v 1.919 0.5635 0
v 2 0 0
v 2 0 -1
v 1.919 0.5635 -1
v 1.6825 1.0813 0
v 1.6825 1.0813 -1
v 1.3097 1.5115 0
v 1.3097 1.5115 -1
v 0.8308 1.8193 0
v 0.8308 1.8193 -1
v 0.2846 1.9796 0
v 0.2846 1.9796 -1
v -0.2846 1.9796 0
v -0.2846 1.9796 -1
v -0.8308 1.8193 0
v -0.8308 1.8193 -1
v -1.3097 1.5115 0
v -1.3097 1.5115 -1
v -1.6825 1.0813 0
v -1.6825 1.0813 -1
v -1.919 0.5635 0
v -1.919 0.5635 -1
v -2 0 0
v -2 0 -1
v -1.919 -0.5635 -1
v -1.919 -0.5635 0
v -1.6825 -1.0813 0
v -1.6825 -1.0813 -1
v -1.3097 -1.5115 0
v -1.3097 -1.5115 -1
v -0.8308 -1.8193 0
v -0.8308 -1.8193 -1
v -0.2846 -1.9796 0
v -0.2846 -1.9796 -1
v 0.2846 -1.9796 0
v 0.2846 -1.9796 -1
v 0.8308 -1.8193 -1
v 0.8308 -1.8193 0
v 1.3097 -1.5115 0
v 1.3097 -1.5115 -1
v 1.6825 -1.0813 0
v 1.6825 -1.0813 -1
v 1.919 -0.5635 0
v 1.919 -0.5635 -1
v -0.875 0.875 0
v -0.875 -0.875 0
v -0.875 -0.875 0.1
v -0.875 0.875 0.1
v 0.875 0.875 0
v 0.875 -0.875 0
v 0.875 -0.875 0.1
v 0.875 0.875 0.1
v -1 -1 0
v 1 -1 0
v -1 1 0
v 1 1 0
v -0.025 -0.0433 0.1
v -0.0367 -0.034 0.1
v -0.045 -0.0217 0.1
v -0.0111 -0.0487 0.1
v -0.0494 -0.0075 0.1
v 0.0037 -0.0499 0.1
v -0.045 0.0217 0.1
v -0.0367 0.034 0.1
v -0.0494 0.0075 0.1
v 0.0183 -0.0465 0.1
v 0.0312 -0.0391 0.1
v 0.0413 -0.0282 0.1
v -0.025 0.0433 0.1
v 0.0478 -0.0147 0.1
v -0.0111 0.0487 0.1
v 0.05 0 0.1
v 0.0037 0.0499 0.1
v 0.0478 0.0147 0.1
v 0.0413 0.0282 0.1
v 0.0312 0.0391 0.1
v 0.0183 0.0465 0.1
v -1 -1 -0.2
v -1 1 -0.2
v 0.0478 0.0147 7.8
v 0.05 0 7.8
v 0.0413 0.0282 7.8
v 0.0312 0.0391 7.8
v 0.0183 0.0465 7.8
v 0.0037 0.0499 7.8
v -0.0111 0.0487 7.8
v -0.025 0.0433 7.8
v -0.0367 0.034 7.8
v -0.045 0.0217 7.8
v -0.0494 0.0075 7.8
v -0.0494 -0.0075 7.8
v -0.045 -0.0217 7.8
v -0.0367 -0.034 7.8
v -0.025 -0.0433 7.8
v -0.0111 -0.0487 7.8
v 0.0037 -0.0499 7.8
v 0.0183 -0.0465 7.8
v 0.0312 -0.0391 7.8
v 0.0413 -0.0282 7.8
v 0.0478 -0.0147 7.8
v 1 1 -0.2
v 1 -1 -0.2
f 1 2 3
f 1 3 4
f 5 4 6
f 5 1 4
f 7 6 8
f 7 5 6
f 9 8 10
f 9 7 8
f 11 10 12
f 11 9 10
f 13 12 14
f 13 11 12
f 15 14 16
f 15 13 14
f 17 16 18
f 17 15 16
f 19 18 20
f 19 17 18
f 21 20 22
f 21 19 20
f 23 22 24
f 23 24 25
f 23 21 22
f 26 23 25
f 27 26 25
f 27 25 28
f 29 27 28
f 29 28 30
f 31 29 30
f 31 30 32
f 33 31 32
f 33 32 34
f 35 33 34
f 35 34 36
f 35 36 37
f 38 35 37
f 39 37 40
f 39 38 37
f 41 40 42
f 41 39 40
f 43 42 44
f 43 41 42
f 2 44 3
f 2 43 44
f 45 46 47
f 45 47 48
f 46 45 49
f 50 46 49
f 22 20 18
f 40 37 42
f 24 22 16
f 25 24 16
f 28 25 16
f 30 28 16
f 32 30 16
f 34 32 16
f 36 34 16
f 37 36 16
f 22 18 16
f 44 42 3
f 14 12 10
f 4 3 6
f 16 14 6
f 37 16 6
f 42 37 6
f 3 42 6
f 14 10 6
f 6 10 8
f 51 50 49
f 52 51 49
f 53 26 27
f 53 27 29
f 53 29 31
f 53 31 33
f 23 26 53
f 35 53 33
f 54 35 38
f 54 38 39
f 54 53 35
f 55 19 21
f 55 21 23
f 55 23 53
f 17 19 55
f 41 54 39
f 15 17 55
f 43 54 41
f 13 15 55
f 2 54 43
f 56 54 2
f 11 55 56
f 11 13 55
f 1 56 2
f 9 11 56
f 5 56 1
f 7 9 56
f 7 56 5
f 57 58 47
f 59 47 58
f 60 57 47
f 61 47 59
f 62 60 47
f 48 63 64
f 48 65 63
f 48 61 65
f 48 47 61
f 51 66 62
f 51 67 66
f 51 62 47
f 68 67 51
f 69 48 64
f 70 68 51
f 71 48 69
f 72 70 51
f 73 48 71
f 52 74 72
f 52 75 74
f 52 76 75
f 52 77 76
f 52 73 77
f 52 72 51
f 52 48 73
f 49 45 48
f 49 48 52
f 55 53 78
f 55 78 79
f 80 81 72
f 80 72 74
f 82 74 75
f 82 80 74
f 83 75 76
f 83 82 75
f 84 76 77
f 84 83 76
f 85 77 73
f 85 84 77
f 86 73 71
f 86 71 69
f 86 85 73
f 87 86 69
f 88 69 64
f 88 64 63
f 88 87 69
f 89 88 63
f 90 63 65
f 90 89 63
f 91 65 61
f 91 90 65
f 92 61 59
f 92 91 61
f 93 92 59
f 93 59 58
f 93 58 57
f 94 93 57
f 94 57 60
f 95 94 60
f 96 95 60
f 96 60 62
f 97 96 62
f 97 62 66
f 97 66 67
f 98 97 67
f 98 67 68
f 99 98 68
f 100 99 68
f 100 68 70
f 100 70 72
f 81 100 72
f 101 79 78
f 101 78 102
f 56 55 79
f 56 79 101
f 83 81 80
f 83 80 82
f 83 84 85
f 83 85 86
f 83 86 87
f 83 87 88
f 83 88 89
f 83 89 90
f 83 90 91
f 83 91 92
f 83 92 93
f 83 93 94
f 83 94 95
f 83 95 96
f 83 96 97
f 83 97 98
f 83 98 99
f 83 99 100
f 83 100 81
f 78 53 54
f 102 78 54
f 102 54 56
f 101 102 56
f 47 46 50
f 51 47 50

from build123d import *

# Parameters (mm, degrees)
F2_R     = 0.05
F3_DEPTH = 7.8
F0_W     = 1.75
F0_H     = 1.75
F4_DEPTH = 0.1
F5_R     = 2
F6_DEPTH = 1
F7_W     = 2
F7_H     = 2
F8_DEPTH = 0.2


with BuildPart() as f3:
    # F2 (on offset) → F3 (new body)
    with BuildSketch(Plane.XY.offset(7.8)):
        Circle(F2_R)
    extrude(amount=-F3_DEPTH)

    # F0 (on Top) → F4 (join)
    with BuildSketch(Plane.XY):
        Rectangle(F0_W, F0_H)
    extrude(amount=F4_DEPTH)


with BuildPart() as f6:
    # F5 (on Top) → F6 (new body)
    with BuildSketch(Plane.XY):
        Circle(F5_R)
    extrude(amount=-F6_DEPTH)

    # F7 (on face) → F8 (cut)
    with BuildSketch(Plane.XY):
        Rectangle(F7_W, F7_H)
    extrude(amount=-F8_DEPTH, mode=Mode.SUBTRACT)


solid = Compound([f3.part, f6.part])
